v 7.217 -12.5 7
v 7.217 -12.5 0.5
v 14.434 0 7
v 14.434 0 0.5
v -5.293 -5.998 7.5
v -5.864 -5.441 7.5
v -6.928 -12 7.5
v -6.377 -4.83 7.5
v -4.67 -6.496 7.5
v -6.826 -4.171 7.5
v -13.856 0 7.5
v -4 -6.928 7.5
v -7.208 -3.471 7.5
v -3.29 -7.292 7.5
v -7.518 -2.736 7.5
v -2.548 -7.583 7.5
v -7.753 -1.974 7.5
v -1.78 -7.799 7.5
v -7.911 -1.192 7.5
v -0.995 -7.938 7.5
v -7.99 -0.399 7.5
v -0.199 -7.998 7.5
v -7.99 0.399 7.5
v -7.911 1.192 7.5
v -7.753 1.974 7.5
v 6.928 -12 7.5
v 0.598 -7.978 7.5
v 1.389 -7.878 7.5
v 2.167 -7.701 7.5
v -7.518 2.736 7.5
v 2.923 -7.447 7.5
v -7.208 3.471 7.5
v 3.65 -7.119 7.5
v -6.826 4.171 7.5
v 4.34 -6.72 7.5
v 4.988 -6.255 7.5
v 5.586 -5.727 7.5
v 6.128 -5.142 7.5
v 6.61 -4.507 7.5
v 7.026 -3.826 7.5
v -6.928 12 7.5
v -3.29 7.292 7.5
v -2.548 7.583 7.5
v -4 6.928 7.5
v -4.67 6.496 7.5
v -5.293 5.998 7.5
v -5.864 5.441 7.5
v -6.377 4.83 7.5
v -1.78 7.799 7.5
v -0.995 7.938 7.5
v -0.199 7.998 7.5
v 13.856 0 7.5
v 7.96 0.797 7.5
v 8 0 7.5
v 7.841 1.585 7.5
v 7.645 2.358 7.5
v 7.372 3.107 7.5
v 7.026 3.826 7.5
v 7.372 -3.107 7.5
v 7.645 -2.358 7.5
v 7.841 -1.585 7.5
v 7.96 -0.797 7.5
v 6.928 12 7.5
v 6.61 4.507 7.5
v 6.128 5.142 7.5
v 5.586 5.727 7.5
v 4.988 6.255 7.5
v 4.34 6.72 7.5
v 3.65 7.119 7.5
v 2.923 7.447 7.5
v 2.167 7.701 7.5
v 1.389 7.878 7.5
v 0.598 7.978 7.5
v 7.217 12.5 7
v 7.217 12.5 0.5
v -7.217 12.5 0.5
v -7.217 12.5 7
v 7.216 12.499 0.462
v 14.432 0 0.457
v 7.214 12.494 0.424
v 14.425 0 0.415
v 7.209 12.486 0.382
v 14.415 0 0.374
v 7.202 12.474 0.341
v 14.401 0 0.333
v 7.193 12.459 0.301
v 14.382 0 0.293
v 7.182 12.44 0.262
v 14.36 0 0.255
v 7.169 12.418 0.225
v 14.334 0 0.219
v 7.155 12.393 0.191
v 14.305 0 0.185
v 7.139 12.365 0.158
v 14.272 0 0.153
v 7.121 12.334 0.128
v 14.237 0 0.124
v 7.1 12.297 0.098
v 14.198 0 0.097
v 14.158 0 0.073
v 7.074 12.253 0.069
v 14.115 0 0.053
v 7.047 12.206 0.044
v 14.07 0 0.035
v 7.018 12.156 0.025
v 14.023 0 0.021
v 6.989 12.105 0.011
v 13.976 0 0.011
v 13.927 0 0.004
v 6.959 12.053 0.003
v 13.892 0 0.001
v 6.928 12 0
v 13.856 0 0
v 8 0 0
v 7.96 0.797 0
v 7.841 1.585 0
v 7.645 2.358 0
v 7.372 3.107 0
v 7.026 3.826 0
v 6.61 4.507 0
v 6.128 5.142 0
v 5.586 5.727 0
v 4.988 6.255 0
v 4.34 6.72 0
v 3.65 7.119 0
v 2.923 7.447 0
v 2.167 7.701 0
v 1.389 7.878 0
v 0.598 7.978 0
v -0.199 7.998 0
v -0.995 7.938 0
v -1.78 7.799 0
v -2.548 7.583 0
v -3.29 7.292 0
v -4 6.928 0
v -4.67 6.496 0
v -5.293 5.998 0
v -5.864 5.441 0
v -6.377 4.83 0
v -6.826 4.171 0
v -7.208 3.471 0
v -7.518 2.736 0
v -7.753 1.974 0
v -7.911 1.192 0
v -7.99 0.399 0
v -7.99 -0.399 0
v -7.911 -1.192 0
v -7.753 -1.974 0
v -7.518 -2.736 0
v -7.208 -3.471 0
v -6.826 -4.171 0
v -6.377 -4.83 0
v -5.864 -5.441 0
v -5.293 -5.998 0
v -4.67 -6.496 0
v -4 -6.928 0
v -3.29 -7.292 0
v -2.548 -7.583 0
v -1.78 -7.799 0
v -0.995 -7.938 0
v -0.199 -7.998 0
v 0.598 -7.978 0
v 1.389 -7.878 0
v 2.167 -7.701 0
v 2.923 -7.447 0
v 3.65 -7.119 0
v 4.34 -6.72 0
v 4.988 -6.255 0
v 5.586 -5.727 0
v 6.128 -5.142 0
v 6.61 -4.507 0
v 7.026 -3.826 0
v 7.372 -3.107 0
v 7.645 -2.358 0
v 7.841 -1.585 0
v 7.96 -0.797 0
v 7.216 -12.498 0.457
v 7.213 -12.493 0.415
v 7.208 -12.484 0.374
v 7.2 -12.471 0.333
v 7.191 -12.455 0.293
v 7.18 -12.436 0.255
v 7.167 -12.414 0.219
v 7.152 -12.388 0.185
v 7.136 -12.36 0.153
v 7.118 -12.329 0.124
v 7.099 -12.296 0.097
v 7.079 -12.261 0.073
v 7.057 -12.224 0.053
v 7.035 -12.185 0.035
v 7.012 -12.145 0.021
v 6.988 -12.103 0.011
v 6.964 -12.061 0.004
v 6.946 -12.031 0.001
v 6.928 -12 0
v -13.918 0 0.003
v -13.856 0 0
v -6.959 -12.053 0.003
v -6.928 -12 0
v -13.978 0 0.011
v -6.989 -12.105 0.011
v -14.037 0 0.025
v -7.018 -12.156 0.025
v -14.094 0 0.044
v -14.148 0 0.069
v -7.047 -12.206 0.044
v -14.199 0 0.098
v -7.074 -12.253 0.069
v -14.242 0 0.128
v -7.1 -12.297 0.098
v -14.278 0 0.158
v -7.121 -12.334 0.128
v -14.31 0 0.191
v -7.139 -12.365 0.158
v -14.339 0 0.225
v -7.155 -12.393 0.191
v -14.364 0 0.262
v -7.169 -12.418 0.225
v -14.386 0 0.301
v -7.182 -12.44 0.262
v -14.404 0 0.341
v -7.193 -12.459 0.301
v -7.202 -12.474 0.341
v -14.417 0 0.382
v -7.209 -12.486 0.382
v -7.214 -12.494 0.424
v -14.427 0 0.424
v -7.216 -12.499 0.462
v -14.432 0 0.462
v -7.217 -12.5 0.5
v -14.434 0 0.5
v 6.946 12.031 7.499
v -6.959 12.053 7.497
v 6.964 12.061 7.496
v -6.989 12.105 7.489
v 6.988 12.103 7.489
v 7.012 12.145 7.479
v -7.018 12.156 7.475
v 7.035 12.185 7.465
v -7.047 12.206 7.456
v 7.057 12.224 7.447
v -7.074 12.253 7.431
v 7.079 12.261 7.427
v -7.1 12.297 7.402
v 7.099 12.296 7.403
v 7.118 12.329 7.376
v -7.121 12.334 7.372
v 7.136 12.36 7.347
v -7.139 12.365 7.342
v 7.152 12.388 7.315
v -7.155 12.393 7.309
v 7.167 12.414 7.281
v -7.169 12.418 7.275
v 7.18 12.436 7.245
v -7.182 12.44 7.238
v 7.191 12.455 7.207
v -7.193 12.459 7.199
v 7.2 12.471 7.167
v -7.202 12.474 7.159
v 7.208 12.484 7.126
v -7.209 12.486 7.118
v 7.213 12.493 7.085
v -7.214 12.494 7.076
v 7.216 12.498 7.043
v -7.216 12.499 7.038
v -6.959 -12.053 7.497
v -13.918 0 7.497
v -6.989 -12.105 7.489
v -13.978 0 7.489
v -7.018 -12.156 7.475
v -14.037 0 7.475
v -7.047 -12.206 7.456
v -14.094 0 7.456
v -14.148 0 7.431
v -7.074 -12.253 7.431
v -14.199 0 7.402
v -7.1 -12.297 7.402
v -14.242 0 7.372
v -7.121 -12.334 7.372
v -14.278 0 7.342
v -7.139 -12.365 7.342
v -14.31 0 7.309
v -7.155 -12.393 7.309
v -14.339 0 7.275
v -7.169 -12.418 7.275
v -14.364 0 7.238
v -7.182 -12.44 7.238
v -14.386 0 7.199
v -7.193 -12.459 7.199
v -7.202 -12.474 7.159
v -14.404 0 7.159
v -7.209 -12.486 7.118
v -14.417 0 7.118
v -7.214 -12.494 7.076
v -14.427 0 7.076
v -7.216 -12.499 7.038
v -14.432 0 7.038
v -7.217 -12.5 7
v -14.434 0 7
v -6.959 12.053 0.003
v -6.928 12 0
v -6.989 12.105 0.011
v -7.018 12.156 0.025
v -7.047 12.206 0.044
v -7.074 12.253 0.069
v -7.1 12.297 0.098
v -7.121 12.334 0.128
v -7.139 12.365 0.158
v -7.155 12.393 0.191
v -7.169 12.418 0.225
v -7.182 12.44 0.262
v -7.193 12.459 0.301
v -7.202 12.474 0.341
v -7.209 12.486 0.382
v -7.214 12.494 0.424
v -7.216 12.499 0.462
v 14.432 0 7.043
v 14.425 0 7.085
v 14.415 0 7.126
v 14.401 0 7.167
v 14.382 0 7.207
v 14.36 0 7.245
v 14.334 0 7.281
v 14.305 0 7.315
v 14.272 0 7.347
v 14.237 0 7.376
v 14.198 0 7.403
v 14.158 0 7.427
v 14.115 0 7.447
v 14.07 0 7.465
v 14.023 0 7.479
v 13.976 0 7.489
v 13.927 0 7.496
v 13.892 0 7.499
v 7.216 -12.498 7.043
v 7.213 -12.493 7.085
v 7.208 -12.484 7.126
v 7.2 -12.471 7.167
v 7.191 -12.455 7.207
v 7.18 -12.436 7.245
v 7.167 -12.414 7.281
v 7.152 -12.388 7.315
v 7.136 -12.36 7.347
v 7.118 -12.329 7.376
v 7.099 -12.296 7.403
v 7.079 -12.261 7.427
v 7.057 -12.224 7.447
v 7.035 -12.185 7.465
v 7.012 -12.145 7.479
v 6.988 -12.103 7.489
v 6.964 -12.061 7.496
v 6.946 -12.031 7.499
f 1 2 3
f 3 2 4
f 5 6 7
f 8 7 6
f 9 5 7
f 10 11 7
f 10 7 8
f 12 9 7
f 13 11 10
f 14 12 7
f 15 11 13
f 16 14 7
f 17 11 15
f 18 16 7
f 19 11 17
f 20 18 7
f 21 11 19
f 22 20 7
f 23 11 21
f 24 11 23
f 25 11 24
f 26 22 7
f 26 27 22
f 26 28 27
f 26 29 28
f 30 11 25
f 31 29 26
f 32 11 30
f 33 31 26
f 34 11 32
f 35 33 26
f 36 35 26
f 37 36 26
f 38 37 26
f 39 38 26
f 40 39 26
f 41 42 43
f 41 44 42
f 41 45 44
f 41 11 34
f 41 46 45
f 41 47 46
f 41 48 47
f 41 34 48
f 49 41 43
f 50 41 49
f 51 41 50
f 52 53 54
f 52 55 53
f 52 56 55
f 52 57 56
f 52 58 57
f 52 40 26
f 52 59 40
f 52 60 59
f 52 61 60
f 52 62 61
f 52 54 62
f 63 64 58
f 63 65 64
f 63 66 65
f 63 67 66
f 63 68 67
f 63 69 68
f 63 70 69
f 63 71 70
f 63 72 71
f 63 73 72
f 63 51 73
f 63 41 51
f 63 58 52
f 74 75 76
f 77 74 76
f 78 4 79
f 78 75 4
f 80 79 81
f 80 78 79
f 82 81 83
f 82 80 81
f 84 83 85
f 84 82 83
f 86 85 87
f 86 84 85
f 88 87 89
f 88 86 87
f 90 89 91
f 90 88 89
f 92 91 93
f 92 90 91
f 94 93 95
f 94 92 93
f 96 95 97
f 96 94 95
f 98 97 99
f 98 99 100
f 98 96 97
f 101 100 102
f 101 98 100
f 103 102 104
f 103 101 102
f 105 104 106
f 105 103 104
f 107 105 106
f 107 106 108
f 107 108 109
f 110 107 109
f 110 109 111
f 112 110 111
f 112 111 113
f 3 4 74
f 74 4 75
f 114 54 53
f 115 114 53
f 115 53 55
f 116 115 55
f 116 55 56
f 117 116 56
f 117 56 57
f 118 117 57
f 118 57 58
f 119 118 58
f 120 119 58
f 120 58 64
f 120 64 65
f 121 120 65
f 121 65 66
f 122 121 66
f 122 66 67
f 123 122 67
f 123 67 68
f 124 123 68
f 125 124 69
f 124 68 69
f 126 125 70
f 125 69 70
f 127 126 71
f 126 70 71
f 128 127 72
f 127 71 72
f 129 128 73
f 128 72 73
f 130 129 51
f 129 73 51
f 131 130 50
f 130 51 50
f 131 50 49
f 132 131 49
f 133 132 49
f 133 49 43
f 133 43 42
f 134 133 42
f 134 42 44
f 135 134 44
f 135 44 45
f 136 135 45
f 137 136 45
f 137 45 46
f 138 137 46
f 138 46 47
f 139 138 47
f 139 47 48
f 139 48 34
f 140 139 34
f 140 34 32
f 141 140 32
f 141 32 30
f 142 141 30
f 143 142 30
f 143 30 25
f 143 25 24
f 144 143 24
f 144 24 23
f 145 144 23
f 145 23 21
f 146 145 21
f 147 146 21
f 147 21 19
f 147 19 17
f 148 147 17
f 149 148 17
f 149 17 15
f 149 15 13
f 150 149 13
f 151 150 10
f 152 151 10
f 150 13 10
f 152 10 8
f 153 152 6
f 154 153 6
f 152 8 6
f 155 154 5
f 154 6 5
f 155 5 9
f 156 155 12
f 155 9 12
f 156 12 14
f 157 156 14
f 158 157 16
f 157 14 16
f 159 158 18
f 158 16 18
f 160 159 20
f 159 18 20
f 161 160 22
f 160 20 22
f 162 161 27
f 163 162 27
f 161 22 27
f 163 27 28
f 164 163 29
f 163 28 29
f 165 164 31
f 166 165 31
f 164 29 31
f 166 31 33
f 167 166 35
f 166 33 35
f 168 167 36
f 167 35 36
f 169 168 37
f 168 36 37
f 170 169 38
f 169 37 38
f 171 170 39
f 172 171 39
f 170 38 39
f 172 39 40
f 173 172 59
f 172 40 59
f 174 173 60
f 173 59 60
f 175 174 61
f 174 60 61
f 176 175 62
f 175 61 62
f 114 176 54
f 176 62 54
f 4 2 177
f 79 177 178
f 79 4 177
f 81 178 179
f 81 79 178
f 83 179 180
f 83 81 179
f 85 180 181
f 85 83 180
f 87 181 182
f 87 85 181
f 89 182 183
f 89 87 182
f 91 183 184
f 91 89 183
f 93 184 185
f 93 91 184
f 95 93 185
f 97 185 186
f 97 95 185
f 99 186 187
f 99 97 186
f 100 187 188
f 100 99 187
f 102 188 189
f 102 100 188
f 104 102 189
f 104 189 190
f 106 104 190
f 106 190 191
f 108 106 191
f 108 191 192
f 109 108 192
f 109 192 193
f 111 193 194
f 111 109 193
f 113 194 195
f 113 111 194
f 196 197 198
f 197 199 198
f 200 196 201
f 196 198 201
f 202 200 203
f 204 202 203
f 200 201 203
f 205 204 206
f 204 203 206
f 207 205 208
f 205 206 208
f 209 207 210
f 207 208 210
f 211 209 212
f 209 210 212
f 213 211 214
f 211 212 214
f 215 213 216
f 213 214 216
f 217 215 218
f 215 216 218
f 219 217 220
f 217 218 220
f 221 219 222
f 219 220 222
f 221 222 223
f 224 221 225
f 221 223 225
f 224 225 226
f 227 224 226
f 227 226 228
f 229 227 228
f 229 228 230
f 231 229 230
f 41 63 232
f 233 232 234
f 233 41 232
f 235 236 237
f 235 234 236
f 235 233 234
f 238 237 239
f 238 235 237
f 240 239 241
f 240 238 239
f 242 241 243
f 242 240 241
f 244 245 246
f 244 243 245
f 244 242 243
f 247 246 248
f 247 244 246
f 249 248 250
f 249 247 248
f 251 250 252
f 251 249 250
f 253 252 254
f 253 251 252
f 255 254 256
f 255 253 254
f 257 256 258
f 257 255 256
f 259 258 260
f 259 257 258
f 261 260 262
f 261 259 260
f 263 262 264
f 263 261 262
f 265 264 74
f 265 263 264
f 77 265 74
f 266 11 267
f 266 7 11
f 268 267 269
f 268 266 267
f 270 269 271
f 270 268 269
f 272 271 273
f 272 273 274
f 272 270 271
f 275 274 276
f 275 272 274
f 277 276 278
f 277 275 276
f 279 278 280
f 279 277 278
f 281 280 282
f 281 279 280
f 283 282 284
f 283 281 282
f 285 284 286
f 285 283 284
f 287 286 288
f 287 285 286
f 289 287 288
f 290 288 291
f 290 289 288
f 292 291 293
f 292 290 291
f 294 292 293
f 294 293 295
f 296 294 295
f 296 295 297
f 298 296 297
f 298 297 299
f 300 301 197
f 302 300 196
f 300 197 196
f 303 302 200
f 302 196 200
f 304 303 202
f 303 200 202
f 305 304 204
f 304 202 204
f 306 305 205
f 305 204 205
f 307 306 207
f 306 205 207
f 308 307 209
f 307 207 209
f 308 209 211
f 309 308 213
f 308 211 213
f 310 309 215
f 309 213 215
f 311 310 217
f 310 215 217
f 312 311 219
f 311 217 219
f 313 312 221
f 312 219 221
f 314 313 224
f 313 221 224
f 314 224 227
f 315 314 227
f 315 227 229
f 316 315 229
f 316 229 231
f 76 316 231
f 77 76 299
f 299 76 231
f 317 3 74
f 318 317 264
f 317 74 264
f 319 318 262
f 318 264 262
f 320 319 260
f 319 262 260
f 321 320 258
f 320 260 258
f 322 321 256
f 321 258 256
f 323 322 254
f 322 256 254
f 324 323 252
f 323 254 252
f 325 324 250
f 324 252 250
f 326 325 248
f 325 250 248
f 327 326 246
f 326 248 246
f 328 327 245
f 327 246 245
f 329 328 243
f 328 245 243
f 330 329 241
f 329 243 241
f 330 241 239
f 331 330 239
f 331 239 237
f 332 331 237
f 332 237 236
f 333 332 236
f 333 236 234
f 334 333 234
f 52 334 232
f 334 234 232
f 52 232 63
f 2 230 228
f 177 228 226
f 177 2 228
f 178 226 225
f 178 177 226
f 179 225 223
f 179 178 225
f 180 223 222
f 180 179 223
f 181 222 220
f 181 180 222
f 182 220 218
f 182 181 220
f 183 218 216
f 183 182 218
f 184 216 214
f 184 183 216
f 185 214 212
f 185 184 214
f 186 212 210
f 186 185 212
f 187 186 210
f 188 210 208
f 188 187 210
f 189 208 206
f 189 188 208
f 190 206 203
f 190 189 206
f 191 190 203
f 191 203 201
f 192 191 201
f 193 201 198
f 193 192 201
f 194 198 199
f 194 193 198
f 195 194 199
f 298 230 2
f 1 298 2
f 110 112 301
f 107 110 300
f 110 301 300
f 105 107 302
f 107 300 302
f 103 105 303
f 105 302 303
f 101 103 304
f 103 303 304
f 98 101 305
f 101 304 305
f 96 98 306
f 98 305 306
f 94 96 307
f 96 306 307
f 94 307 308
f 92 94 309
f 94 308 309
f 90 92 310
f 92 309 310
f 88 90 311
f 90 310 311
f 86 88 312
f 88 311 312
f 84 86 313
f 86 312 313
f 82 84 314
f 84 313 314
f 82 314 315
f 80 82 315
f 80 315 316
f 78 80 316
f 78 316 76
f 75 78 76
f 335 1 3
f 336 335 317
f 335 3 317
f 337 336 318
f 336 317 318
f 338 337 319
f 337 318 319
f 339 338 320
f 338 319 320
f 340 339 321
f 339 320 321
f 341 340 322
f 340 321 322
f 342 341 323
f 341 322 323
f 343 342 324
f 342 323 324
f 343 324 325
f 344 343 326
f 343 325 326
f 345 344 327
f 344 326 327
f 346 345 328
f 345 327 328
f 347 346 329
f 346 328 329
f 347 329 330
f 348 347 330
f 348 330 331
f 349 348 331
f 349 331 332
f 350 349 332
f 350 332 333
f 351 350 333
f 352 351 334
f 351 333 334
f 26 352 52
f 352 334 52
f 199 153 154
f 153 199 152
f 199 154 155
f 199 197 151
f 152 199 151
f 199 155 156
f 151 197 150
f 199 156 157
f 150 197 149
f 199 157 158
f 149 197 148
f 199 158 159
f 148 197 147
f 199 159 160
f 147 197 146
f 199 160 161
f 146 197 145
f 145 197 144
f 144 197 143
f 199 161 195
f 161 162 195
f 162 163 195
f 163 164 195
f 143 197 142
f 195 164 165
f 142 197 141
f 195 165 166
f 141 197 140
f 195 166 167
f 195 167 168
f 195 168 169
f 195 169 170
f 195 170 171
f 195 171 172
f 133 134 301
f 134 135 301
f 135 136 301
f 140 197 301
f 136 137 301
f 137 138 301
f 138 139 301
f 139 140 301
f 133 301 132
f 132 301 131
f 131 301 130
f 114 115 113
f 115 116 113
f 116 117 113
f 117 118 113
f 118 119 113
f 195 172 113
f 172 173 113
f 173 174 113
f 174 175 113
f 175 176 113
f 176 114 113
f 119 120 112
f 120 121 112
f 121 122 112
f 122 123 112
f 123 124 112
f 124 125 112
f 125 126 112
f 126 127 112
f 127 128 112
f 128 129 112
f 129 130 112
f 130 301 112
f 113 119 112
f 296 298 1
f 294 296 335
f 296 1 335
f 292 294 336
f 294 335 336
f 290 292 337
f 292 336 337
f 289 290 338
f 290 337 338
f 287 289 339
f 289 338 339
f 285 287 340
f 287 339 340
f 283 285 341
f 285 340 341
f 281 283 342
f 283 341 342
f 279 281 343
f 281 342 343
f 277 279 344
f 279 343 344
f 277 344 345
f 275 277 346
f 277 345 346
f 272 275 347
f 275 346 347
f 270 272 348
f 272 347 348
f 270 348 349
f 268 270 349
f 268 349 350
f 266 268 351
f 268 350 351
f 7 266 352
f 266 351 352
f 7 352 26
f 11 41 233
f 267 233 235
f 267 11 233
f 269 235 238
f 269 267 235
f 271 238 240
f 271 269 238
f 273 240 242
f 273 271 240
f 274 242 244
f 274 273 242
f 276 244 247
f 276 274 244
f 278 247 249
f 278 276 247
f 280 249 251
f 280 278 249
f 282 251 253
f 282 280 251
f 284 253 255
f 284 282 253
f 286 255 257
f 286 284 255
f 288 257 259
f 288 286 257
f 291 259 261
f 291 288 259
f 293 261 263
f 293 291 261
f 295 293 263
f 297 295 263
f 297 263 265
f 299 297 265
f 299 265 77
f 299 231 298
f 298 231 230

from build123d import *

# Parameters (mm, degrees)
EXTRUDE_1_DEPTH     = 7.5
SKETCH_3_R          = 8
CUT_EXTRUDE_1_DEPTH = 21.514222708
FILLET_1_R          = 0.5


with BuildPart() as part:
    # 草图2 → 凸台-拉伸1 (new body)
    with BuildSketch(Plane.XY):
        Polygon((7.216878365, -12.5), (14.43375673, 0), (7.216878365, 12.5), (-7.216878365, 12.5), (-14.43375673, 0), (-7.216878365, -12.5), align=None)
    extrude(amount=EXTRUDE_1_DEPTH)

    # 草图3 → 切除-拉伸1 (cut, through all)
    with BuildSketch(Plane.XY.offset(7.5)):
        Circle(SKETCH_3_R)
    extrude(amount=-CUT_EXTRUDE_1_DEPTH, mode=Mode.SUBTRACT)

    # 圆角1
    fillet_1_edges = [part.edges().sort_by_distance(p)[0] for p in [
        (10.825317547, 6.25, 7.5),
        (0, 12.5, 7.5),
        (-10.825317547, 6.25, 7.5),
        (-10.825317547, -6.25, 7.5),
        (0, -12.5, 7.5),
        (-10.825317547, -6.25, 0),
        (-10.825317547, 6.25, 0),
        (0, 12.5, 0),
        (10.825317547, -6.25, 7.5),
        (10.825317547, 6.25, 0),
        (10.825317547, -6.25, 0),
        (0, -12.5, 0),
    ]]
    fillet(fillet_1_edges, radius=FILLET_1_R)


solid = part.part
